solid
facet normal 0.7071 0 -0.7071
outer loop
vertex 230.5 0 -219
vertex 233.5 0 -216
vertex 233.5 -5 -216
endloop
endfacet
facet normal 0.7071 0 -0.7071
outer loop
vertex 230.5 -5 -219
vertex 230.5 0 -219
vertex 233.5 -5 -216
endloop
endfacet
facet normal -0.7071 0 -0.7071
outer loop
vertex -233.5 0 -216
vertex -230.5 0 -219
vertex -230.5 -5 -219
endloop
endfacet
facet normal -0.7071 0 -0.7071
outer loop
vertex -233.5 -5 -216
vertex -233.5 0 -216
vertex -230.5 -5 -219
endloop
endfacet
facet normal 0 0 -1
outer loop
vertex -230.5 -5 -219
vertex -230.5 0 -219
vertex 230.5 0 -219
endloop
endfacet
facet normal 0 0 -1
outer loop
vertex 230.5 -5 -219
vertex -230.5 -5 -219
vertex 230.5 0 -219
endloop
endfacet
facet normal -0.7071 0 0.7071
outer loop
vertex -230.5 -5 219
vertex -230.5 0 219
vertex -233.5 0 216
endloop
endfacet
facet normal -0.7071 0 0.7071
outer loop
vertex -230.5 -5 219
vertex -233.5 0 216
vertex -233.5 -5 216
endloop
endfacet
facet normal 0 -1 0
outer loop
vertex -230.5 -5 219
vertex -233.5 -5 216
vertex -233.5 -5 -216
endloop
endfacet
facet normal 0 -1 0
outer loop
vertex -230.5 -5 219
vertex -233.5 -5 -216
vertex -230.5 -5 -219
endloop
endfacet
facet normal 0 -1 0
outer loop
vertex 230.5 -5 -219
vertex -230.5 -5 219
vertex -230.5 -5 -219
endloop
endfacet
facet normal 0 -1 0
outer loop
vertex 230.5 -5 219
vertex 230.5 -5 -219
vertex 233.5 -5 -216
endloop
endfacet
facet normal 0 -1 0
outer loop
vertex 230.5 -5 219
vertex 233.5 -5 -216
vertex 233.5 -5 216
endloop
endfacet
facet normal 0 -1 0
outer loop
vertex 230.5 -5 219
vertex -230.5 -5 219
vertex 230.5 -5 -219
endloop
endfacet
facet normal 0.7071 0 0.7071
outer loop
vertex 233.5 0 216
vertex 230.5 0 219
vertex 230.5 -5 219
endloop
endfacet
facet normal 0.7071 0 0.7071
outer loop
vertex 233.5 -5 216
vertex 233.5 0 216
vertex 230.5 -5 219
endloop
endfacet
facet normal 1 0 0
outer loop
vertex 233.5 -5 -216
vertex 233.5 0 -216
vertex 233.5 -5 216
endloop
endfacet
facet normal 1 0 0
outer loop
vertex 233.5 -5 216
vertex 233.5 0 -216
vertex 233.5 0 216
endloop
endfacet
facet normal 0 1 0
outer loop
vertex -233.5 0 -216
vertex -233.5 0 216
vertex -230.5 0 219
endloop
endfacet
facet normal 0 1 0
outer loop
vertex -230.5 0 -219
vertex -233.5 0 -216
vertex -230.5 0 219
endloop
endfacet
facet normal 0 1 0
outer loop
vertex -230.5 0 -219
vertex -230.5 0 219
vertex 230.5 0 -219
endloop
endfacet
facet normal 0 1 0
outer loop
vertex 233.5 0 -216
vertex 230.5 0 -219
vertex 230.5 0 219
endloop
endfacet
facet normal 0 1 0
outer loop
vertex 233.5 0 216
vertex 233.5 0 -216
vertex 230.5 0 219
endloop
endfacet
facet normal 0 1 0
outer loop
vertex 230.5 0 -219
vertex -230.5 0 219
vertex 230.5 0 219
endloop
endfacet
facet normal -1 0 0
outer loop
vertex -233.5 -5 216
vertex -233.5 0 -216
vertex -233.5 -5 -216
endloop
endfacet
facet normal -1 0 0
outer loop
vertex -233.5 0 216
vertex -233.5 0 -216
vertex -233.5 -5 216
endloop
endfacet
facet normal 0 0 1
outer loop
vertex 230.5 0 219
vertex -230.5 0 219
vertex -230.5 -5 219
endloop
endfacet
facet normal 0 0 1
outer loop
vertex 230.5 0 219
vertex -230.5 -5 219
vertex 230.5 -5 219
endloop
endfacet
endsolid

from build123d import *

# Parameters (mm, degrees)
F0_W     = 467
F0_H     = 438
F1_DEPTH = 5
F2_SIZE2 = 3
F2_SIZE  = 3


with BuildPart() as f1:
    # F0 (on Front) → F1 (new body)
    with BuildSketch(Plane.XZ):
        Rectangle(F0_W, F0_H)
    extrude(amount=F1_DEPTH)

    # F2
    f2_edges = [f1.edges().sort_by_distance(p)[0] for p in [
        (-233.5, -2.5, 219),
        (-233.5, -2.5, -219),
        (233.5, -2.5, -219),
        (233.5, -2.5, 219),
    ]]
    chamfer(f2_edges, length=F2_SIZE, length2=F2_SIZE2)


solid = f1.part
